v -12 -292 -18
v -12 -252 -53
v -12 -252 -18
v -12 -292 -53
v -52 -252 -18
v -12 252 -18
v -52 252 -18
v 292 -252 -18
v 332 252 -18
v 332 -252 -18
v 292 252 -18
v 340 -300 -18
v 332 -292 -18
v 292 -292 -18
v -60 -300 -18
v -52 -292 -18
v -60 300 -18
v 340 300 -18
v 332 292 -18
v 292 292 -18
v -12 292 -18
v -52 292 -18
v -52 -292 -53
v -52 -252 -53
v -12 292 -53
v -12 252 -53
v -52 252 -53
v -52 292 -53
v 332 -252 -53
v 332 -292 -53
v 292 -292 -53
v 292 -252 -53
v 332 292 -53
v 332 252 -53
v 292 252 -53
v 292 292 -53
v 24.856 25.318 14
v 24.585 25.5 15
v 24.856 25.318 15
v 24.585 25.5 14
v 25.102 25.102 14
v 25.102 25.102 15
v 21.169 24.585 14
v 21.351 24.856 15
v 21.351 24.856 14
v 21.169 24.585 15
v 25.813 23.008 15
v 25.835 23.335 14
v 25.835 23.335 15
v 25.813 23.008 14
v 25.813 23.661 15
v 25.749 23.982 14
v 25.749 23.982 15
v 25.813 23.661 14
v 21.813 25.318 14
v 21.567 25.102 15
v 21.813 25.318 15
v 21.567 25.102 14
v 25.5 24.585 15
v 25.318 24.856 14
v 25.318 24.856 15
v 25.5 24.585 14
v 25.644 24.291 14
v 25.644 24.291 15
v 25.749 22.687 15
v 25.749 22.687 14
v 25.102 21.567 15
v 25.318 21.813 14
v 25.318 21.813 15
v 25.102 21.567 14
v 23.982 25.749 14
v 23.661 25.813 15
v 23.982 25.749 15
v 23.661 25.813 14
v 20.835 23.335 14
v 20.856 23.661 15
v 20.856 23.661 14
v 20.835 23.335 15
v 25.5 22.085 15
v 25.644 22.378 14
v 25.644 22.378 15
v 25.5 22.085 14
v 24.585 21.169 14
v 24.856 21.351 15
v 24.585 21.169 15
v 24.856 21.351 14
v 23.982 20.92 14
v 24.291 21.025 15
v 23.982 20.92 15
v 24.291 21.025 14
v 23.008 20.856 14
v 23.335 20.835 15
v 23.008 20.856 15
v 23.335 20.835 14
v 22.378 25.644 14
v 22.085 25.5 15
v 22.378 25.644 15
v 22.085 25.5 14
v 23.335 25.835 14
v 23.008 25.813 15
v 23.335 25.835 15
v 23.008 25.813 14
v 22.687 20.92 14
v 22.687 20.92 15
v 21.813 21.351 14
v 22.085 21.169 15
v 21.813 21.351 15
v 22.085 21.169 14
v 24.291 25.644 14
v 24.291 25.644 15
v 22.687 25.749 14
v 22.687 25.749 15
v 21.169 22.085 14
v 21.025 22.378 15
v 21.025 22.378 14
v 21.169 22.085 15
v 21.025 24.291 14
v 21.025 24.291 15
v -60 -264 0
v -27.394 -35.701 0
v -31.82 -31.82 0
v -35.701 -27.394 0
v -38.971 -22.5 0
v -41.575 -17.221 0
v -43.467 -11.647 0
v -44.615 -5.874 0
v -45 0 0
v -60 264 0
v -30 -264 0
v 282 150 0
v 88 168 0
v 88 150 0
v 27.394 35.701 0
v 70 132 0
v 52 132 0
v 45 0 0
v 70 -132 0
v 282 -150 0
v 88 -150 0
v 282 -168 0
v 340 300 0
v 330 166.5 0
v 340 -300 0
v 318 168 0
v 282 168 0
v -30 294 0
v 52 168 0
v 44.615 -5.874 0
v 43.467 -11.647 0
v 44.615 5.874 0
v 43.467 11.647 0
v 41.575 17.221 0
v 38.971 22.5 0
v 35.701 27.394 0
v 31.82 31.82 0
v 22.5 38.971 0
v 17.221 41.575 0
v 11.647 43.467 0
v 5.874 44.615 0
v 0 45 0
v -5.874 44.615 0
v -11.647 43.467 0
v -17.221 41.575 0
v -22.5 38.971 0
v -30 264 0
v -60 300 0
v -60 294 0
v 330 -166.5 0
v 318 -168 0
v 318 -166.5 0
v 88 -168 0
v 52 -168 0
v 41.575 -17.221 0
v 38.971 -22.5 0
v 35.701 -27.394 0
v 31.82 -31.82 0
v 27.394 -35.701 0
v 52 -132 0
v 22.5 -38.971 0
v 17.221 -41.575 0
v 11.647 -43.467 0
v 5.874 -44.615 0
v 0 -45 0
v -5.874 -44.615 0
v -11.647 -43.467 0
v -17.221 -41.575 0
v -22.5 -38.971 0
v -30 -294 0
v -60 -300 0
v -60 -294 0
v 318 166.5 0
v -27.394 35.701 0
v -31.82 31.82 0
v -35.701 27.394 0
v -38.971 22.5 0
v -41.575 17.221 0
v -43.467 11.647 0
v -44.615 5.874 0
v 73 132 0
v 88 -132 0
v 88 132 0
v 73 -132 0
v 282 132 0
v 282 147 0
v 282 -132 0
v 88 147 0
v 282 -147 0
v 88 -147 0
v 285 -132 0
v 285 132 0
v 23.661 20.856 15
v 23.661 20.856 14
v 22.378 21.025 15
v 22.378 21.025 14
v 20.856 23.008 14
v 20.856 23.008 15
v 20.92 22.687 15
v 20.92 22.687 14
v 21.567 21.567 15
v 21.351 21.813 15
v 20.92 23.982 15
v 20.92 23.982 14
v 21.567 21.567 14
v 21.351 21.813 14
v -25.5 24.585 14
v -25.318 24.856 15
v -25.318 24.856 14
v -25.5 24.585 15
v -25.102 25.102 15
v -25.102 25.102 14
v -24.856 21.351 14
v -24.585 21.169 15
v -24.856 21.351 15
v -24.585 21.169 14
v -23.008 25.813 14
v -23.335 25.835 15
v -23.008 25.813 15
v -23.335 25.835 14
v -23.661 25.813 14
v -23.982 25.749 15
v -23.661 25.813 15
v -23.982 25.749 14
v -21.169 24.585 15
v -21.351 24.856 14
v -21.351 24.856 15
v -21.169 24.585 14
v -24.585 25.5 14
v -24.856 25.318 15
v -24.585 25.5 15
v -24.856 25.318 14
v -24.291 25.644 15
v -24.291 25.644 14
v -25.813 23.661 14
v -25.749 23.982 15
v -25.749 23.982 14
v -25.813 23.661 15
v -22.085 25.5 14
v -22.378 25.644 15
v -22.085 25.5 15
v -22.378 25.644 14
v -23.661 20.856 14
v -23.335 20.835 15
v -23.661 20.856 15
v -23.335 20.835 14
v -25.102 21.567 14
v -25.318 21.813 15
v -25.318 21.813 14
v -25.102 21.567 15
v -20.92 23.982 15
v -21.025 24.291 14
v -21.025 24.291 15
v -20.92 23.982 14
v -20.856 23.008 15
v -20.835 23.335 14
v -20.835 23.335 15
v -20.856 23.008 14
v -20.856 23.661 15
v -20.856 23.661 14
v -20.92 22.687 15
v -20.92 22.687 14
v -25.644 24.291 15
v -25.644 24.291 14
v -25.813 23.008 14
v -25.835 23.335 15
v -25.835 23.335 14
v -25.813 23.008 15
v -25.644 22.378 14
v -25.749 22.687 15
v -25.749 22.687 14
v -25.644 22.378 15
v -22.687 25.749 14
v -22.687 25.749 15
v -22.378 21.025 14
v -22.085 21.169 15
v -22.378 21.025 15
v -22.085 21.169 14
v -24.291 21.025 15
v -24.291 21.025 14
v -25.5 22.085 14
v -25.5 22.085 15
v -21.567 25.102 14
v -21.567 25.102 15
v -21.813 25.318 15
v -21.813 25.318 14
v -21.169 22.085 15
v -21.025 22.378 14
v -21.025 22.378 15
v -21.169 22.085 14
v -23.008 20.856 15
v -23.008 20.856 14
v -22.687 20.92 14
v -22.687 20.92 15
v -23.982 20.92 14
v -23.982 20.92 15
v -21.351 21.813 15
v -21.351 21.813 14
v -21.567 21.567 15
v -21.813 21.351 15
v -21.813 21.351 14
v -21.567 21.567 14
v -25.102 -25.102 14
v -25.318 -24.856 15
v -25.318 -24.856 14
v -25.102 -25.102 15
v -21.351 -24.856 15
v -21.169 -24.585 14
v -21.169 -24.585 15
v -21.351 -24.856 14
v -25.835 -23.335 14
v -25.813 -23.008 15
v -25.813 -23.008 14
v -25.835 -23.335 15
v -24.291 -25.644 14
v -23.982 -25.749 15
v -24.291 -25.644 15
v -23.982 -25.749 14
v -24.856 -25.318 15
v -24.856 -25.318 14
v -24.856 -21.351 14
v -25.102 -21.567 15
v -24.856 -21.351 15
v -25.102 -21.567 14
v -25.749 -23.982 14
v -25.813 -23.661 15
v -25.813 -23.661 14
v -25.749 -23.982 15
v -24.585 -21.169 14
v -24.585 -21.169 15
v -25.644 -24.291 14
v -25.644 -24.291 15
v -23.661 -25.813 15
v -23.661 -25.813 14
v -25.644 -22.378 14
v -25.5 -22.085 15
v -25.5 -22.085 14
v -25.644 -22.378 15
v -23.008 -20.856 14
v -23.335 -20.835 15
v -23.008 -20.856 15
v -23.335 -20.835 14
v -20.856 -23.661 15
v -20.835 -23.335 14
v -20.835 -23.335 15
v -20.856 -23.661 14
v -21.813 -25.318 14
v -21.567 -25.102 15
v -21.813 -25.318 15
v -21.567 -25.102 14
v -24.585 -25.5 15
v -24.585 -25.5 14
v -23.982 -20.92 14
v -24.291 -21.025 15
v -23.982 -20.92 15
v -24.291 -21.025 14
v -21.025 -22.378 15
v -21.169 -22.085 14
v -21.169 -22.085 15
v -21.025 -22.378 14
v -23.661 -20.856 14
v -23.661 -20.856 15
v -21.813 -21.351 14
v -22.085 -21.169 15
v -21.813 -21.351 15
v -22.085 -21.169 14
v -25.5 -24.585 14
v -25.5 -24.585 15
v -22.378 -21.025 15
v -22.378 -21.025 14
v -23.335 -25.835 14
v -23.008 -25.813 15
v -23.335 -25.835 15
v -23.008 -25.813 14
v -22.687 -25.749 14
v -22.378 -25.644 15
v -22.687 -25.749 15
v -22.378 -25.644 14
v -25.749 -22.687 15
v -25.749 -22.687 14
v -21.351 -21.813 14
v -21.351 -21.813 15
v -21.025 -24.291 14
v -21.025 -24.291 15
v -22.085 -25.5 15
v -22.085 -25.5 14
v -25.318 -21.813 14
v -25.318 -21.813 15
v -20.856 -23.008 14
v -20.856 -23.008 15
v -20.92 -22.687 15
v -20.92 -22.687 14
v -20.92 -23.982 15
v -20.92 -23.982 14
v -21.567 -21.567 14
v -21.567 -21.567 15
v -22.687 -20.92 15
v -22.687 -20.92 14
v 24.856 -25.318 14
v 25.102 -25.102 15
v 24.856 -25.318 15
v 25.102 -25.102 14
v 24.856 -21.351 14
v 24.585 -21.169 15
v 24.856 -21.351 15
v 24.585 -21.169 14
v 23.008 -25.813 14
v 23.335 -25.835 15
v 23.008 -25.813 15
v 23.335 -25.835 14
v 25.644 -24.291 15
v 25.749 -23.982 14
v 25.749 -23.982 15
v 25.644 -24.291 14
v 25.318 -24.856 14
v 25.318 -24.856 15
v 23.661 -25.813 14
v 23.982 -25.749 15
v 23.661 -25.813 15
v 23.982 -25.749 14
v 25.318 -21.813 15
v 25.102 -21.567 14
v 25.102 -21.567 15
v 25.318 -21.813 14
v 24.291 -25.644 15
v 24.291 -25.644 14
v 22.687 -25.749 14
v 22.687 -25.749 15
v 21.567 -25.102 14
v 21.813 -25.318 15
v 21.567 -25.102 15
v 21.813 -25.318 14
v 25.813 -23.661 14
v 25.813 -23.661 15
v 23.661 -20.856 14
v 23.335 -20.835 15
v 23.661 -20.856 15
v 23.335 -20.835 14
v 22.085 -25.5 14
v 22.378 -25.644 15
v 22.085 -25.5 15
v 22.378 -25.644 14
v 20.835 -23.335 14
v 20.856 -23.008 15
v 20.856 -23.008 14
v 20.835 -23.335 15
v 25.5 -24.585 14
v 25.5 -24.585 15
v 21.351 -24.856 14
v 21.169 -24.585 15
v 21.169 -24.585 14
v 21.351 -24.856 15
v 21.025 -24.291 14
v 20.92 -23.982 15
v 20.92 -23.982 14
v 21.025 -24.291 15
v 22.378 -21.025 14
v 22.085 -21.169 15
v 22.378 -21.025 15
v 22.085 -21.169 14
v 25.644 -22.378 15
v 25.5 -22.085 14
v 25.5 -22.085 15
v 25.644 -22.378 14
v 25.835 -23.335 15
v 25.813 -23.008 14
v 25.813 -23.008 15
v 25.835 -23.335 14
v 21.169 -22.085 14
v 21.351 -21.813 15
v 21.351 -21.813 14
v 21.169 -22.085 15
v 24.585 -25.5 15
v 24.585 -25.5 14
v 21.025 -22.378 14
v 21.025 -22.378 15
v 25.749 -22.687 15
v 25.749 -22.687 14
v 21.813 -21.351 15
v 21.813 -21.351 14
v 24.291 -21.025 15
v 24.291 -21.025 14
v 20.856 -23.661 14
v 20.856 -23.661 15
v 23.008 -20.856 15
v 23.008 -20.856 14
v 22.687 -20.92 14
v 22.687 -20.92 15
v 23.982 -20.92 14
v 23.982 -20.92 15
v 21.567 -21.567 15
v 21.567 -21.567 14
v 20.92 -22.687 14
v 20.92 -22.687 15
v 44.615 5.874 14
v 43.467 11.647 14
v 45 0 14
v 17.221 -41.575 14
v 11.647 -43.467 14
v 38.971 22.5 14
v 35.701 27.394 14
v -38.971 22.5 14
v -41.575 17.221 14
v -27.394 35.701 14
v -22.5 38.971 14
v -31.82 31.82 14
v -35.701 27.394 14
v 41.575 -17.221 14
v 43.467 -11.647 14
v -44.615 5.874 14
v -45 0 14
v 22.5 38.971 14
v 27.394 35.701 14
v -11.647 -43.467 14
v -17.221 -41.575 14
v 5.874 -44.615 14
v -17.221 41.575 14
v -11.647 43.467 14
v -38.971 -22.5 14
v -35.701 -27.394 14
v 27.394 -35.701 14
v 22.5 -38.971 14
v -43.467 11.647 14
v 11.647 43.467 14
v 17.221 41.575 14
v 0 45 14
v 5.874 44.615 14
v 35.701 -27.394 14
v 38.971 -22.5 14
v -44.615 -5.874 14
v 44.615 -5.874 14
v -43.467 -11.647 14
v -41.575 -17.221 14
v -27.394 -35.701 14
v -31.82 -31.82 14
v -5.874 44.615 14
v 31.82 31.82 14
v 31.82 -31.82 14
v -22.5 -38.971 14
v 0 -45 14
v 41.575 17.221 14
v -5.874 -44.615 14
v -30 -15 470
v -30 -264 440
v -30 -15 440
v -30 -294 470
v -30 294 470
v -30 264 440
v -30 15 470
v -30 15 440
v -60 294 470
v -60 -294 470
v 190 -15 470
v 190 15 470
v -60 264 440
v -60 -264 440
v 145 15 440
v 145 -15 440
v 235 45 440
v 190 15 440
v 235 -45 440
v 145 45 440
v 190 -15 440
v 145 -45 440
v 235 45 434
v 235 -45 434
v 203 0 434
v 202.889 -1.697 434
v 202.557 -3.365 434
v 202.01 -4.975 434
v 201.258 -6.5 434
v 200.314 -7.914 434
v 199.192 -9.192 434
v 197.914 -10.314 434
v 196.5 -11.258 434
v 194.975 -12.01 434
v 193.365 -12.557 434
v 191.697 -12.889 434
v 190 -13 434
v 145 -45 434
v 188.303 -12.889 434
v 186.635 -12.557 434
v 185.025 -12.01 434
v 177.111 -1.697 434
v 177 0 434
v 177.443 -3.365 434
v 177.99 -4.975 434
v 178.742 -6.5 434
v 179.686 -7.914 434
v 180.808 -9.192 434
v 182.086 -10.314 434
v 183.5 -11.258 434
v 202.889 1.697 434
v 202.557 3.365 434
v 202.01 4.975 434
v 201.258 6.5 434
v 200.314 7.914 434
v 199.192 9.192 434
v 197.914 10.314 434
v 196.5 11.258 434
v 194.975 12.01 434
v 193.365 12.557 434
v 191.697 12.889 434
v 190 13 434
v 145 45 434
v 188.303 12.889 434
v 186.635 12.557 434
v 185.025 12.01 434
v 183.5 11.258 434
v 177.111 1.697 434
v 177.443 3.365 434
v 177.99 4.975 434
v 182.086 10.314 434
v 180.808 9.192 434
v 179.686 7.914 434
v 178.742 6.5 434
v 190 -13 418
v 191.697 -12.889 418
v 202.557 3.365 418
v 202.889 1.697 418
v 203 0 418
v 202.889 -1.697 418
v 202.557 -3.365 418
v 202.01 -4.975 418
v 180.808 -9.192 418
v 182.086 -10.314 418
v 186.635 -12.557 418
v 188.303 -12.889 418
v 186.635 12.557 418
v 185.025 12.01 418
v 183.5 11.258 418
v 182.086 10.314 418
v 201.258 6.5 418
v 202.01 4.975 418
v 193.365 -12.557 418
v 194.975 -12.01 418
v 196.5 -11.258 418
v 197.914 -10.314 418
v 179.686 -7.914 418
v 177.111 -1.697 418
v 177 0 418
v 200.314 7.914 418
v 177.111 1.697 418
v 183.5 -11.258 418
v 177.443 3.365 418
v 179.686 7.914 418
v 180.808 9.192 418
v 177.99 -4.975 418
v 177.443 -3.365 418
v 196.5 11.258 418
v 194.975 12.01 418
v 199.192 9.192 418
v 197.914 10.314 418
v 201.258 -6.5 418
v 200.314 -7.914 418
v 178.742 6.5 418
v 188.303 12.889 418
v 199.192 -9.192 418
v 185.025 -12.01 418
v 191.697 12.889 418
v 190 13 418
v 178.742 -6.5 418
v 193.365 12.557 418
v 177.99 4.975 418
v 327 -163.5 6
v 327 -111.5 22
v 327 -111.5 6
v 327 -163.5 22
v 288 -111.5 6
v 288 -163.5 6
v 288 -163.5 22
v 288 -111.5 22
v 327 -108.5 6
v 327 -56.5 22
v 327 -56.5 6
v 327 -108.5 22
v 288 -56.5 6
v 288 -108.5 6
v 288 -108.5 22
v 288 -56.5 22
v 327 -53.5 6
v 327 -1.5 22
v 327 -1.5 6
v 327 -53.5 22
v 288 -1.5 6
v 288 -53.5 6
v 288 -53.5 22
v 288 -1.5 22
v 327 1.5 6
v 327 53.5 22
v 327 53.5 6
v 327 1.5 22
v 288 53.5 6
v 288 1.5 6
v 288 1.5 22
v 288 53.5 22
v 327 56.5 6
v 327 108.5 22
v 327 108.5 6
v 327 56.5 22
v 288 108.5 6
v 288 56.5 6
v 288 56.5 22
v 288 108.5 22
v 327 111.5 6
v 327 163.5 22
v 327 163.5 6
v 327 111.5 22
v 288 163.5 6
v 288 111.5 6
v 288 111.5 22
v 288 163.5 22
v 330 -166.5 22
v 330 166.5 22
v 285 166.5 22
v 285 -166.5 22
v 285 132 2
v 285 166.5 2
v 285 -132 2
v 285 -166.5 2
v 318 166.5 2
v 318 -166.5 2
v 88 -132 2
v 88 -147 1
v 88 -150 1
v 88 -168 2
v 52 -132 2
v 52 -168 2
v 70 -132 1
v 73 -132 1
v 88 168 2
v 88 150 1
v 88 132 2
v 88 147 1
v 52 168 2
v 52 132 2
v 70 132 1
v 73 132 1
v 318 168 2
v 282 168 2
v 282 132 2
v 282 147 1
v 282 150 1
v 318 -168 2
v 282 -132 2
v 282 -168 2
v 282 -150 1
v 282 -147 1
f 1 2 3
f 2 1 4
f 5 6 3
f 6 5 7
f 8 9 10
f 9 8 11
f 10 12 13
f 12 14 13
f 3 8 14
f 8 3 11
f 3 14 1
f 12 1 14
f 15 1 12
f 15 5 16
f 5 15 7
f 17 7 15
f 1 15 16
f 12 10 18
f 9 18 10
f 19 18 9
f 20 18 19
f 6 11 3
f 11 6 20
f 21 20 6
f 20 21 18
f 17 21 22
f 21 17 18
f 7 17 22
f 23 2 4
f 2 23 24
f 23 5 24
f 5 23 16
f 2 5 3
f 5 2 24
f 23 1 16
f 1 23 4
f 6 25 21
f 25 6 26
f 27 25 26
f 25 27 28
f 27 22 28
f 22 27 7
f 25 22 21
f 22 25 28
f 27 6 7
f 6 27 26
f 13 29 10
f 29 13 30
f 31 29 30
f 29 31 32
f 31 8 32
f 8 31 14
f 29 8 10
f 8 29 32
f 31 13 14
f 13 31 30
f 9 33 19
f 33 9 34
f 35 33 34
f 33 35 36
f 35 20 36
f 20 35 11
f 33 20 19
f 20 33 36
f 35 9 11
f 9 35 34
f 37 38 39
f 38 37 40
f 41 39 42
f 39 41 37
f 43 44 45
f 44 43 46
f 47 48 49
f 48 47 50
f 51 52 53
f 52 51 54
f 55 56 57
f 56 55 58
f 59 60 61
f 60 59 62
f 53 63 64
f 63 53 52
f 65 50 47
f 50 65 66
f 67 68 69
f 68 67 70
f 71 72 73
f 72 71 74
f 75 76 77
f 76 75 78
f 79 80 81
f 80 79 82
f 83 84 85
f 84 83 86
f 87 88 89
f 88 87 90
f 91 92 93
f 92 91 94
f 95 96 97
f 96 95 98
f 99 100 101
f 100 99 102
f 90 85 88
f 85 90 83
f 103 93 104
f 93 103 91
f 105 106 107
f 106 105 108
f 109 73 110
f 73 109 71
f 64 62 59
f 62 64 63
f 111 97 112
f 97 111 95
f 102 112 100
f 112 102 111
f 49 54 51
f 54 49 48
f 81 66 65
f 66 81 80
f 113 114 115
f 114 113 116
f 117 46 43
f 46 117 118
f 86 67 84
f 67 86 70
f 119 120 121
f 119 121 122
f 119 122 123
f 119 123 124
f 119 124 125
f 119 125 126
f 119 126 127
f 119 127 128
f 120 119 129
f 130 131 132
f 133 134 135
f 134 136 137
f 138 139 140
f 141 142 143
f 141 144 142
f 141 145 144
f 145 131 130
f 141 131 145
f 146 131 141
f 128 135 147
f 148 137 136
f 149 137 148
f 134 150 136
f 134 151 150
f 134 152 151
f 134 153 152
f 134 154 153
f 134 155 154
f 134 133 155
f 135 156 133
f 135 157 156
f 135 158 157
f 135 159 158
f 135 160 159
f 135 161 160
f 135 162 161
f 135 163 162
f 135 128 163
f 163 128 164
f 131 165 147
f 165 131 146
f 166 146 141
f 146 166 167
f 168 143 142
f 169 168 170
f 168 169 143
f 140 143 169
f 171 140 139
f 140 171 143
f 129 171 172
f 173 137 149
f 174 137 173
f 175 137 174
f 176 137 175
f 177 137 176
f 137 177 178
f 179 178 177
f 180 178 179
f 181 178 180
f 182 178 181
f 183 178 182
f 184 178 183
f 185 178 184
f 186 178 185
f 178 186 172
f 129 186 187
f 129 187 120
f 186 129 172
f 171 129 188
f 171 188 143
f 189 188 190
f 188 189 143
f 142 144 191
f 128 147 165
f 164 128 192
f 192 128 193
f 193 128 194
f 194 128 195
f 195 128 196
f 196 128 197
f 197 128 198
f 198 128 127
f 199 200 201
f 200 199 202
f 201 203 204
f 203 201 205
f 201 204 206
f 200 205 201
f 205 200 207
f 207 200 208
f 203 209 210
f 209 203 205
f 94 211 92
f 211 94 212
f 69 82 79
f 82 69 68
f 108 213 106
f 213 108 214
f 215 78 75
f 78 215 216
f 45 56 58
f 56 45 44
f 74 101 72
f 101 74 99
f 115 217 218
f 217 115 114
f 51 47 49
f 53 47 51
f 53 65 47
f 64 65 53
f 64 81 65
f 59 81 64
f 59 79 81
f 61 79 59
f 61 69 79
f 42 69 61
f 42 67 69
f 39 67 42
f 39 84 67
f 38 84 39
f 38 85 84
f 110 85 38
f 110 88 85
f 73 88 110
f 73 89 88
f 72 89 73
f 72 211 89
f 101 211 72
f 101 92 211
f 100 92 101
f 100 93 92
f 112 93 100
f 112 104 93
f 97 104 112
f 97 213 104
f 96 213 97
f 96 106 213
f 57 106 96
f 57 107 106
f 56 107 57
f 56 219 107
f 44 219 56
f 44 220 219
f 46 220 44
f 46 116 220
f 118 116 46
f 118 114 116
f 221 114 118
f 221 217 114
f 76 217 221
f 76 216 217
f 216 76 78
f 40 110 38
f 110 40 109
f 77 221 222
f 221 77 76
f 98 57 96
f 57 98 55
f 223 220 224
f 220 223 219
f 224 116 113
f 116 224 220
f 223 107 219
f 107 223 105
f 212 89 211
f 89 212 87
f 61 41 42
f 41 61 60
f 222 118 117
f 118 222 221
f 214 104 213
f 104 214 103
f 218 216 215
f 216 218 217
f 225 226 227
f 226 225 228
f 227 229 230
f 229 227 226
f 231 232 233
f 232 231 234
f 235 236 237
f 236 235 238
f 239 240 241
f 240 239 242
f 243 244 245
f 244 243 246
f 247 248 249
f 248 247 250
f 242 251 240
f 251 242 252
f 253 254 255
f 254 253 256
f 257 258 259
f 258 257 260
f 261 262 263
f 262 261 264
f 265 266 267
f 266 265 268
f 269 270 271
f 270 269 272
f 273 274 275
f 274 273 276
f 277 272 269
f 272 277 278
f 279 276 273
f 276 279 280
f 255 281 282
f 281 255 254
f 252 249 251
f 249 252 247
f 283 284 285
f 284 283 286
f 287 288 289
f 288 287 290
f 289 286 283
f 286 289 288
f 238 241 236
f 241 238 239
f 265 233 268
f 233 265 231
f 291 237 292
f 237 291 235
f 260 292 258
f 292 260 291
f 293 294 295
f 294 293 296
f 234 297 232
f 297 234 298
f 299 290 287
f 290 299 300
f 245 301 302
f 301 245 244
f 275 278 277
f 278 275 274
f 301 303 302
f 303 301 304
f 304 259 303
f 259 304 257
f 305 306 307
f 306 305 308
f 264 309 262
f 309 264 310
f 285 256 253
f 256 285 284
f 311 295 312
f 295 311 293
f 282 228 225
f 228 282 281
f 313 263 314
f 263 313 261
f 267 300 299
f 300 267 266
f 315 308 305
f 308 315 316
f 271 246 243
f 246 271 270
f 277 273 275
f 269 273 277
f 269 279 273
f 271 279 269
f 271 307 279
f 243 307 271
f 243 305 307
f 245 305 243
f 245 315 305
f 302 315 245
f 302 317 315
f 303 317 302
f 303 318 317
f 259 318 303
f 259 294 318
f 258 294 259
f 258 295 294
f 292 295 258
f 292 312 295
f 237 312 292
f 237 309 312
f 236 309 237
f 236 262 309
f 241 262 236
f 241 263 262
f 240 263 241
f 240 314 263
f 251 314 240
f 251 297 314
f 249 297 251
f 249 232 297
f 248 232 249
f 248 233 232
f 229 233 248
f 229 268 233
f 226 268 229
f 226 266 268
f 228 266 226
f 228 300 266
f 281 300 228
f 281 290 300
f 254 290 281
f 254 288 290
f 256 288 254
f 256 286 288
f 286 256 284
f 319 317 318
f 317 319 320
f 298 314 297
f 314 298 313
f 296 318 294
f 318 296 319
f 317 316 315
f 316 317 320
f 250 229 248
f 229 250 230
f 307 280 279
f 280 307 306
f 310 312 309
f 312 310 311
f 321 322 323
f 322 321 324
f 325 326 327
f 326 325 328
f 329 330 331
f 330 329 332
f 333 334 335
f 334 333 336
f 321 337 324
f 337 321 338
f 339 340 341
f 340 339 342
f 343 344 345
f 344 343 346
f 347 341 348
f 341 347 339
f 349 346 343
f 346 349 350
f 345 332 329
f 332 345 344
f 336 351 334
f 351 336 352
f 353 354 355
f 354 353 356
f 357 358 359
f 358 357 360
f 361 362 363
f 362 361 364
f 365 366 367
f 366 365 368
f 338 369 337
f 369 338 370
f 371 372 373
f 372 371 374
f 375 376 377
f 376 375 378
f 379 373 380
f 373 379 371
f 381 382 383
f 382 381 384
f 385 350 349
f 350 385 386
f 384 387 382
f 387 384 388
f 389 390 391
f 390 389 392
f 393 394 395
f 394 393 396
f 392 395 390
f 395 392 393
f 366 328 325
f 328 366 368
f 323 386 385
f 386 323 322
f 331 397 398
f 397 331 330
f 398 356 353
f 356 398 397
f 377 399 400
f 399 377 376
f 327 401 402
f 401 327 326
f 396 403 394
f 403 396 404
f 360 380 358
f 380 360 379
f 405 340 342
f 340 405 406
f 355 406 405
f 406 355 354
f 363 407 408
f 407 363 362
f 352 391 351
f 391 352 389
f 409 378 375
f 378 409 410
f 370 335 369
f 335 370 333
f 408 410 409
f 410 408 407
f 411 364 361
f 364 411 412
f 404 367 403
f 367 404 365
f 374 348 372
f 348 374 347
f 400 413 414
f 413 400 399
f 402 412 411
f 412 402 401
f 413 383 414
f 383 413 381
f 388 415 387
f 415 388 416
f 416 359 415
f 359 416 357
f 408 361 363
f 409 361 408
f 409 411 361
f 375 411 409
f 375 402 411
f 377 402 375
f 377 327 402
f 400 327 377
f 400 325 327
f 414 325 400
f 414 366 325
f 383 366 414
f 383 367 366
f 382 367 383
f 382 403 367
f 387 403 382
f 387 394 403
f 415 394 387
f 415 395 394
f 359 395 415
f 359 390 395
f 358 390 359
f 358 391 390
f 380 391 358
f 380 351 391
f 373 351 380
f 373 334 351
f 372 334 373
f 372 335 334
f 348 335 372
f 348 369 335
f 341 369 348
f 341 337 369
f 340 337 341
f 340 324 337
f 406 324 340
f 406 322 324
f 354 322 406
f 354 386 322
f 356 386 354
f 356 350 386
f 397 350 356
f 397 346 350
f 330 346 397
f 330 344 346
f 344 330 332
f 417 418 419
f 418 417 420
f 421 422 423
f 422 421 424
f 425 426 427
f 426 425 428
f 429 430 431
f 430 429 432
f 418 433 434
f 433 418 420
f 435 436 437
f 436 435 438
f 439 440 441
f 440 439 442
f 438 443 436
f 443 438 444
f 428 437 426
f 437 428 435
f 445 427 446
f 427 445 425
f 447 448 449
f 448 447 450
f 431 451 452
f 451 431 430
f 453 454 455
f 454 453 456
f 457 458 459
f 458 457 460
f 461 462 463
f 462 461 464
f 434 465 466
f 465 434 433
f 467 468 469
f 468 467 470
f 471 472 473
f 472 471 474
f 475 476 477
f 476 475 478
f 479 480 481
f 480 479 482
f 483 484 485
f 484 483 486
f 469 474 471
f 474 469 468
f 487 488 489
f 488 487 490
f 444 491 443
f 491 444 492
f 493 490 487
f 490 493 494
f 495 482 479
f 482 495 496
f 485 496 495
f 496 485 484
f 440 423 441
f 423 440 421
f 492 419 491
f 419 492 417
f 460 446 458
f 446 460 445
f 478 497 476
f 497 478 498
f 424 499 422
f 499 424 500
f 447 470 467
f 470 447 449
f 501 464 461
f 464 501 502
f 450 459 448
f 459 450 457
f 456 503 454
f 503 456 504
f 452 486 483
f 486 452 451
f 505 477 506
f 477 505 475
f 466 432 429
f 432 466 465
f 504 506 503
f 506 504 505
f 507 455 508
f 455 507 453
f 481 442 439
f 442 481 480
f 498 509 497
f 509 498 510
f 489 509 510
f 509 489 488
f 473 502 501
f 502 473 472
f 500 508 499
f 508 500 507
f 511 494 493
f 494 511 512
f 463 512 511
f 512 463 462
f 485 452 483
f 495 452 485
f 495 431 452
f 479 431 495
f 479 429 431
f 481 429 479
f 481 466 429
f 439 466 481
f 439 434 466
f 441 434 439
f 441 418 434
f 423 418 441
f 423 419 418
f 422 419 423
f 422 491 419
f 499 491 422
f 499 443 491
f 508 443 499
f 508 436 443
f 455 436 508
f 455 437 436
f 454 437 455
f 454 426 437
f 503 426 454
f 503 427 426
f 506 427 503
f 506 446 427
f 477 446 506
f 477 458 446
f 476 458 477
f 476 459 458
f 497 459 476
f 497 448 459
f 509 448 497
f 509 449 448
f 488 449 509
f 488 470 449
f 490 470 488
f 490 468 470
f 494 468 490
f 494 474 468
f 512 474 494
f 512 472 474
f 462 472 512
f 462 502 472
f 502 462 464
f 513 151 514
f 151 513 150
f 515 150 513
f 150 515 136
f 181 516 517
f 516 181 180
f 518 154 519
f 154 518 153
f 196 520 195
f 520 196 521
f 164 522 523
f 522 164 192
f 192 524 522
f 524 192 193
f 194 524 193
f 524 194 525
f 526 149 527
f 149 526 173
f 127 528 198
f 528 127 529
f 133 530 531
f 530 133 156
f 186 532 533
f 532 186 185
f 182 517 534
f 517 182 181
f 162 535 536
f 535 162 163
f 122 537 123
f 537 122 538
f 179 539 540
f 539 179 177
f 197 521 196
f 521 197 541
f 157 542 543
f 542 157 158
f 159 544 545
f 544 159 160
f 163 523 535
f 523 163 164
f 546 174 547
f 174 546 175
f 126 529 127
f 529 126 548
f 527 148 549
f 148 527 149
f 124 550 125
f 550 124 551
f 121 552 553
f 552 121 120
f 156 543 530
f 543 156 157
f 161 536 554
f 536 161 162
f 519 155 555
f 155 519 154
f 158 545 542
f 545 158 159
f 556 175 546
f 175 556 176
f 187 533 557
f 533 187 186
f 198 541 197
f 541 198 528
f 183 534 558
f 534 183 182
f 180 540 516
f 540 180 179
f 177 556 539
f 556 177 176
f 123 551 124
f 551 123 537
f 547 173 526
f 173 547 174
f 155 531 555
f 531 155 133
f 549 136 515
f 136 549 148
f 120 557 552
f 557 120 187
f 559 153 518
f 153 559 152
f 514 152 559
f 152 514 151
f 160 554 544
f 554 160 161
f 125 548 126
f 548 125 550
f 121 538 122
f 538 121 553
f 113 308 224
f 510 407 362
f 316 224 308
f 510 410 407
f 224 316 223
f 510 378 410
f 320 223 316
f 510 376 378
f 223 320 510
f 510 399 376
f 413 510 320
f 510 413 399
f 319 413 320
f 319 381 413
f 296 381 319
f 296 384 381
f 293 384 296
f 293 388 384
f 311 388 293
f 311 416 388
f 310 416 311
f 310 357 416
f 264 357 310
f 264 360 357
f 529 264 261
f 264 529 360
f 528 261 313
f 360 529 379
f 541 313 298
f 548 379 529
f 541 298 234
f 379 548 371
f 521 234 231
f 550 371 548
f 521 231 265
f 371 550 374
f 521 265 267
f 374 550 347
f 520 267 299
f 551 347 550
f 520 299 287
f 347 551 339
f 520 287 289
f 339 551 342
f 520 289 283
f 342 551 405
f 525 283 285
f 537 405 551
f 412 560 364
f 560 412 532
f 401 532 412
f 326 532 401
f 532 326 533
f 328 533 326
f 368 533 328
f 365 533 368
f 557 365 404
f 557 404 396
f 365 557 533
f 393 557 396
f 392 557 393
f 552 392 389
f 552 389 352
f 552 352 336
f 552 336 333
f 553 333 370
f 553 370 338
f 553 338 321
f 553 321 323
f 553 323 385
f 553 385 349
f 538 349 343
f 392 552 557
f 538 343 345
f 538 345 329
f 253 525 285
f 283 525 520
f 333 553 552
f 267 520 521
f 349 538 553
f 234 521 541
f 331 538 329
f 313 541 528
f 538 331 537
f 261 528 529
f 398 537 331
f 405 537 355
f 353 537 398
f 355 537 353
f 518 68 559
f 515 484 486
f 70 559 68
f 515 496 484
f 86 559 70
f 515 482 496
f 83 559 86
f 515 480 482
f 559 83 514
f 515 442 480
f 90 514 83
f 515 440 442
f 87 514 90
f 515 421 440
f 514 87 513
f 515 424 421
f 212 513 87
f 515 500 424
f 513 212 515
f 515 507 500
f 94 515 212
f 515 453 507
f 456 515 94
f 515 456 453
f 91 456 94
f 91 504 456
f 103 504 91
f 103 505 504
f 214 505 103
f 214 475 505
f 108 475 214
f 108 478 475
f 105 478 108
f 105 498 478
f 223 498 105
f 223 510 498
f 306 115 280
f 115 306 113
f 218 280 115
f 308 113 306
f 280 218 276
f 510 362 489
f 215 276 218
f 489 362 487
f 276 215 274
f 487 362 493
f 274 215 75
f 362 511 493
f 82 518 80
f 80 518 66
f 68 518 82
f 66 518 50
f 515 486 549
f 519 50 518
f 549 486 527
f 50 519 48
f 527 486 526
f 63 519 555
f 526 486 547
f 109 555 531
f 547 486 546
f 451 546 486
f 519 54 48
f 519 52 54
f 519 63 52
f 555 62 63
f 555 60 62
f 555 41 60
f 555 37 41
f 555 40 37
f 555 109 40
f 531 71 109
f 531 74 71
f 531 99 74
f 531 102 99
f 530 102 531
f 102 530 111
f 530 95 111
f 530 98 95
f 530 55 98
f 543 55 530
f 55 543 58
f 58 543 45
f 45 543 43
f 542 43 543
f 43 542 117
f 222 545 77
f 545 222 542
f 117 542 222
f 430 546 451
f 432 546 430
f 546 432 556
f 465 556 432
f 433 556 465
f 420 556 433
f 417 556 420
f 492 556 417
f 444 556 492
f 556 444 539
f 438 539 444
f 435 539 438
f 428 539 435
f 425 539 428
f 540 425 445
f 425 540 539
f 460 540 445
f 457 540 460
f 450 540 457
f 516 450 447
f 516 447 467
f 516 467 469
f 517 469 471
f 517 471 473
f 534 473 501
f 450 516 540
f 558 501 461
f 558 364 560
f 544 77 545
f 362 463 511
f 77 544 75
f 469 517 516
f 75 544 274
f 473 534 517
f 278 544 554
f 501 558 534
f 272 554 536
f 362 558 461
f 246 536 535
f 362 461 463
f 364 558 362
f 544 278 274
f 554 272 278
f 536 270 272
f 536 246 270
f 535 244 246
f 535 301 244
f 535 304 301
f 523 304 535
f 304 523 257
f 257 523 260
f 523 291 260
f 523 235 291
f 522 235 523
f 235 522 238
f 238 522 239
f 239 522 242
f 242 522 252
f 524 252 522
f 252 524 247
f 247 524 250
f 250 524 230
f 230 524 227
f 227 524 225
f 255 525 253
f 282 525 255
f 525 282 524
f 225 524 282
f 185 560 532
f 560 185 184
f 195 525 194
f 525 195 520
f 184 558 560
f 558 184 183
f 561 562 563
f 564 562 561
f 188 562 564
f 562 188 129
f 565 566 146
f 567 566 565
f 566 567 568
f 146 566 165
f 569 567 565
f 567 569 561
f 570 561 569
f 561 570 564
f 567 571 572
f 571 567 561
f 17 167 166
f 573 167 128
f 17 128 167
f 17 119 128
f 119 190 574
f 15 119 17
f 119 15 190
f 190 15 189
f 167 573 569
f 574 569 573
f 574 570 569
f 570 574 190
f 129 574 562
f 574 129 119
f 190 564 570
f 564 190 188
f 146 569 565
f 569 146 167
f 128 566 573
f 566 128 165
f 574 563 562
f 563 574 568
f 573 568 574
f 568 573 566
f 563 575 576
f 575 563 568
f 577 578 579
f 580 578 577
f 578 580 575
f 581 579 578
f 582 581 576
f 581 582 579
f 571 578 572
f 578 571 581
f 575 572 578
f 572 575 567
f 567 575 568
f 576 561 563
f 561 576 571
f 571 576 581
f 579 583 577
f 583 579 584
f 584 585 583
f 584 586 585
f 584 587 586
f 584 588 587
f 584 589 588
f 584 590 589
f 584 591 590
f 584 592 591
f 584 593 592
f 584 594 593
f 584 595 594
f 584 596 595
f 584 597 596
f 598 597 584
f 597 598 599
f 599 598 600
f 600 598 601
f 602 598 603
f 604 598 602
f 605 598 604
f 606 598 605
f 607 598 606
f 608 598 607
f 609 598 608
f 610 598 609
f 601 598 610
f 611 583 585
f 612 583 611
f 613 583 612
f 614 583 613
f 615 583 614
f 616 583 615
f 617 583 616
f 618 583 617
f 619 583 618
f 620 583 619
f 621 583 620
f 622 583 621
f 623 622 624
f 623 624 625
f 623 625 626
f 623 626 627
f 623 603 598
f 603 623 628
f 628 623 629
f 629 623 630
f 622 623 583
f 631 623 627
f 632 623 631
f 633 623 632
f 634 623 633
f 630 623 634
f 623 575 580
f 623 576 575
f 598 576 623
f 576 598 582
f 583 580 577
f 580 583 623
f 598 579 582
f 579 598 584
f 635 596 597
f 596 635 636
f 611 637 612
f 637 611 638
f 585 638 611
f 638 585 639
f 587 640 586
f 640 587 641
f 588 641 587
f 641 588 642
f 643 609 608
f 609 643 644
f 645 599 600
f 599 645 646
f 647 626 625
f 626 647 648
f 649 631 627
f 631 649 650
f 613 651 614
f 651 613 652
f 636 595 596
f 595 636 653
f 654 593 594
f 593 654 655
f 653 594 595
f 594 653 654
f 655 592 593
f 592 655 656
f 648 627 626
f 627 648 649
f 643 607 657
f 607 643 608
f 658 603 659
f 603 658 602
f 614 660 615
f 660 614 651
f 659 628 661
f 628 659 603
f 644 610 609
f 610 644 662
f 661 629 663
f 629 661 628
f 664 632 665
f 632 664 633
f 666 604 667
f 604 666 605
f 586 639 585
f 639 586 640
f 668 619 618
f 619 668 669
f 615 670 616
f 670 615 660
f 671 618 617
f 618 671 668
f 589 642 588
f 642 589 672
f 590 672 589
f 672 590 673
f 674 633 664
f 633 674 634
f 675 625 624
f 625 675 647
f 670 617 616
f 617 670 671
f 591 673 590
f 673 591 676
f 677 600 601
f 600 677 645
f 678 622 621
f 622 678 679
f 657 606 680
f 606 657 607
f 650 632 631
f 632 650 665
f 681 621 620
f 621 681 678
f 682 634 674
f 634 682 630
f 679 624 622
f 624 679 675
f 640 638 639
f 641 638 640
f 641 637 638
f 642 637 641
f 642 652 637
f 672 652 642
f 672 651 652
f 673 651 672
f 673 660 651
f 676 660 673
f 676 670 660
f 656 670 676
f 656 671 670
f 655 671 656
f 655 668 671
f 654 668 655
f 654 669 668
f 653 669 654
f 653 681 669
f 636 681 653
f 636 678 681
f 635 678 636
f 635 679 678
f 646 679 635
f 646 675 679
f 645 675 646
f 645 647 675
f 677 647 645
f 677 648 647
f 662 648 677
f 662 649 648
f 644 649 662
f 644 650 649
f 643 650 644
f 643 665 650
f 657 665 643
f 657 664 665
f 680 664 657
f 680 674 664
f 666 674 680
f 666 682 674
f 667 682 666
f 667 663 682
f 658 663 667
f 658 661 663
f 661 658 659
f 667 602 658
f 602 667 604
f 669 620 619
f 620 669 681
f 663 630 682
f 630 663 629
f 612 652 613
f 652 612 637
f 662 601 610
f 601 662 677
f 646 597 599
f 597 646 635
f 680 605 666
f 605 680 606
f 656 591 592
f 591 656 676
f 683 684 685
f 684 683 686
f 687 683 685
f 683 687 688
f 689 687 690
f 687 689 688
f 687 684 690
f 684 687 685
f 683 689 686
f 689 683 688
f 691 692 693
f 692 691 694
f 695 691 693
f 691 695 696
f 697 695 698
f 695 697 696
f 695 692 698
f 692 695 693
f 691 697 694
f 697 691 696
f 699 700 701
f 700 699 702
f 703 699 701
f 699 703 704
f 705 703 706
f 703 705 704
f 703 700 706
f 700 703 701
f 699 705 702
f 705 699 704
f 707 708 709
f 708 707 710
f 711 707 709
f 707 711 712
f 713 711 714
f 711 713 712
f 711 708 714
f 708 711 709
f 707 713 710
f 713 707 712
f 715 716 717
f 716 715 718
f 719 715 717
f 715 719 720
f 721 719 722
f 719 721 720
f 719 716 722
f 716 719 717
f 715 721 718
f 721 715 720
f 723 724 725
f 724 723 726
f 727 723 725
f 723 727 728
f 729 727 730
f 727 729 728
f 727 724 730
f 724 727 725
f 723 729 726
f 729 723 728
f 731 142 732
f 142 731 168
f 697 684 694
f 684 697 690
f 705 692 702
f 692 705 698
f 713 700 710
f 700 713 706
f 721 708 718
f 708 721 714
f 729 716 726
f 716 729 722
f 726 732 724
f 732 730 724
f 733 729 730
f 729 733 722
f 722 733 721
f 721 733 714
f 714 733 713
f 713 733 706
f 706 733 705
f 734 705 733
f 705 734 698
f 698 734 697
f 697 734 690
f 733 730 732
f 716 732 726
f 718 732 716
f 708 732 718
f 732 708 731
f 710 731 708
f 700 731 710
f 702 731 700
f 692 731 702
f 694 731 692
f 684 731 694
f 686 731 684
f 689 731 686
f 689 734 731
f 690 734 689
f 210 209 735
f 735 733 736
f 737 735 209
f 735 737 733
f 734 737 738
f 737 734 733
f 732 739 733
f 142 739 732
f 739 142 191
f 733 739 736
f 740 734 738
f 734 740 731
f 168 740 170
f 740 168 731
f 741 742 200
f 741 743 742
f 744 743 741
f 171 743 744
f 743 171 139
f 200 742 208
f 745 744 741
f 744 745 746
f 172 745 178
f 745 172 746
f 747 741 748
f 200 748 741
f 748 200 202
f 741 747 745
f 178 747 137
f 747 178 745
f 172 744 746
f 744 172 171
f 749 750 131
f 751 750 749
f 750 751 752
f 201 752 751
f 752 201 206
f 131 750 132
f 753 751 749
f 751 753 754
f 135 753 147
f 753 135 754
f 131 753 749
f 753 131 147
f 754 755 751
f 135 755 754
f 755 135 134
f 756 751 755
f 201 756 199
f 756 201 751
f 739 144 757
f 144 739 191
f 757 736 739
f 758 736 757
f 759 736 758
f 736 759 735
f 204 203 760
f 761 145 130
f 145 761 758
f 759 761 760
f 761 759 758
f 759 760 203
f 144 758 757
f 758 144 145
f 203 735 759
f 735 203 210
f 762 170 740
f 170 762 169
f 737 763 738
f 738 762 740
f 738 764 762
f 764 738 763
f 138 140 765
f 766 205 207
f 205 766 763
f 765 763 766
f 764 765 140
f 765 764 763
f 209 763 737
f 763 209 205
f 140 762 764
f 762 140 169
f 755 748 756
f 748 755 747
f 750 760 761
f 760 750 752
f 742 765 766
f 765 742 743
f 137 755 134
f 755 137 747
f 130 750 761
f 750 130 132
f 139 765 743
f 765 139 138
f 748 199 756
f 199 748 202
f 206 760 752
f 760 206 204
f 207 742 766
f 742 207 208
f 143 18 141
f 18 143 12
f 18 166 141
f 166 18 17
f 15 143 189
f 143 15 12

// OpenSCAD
// TACTIN workbench — parametric benchtop fixture for the pick-and-place arm.
//
// A rigid work surface with: an arm mounting boss at the back-centre, an
// overhead gantry holding the downward-looking camera centred over the work
// zone, four ArUco calibration pads at the corners of that zone, and a row of
// part-feeder tray cells along the front edge.
//
// Frame matches the software (tactin.geometry): origin at the arm base on the
// surface top, +X toward the front of the bench (toward the work zone), +Y to
// the operator's left, +Z up. The reachable work area is X 70..300, Y +-150.
//
// Render:  openscad -o workbench.stl hardware/workbench.scad
//          openscad -o workbench.png --viewall --autocenter hardware/workbench.scad

$fn = 48;

// ---- parameters (mm) -------------------------------------------------------
bench_depth   = 400;   // X, front-back
bench_width   = 600;   // Y, left-right
surface_t     = 18;    // work-surface thickness
foot_h        = 35;    // benchtop standoff feet
foot          = 40;    // foot footprint

arm_base_inset = 60;   // arm boss distance from the back edge
arm_boss_d     = 90;   // arm mounting boss diameter
arm_boss_h     = 14;

gantry_post    = 30;   // gantry post cross-section
gantry_h       = 470;  // camera height above the surface
cam_plate      = 90;   // camera mount plate size
cam_x          = 190;  // camera centred over the middle of the work zone (X)

tray_cells     = 6;
tray_cell      = 55;
tray_depth     = 45;
tray_wall      = 3;

aruco_pad      = 36;
aruco_pad_h    = 2;

// Work-zone corners (for the calibration pads), in the software frame.
work_x0 = 70;  work_x1 = 300;
work_y0 = -150; work_y1 = 150;

// A box centred in X/Y, resting with its base at z = zbase.
module box(sx, sy, sz, x, y, zbase) {
    translate([x, y, zbase + sz/2]) cube([sx, sy, sz], center = true);
}

// ---- parts -----------------------------------------------------------------
// The surface top is z=0; the slab hangs below it. The arm base is at (0,0,0).
module work_surface() {
    color("BurlyWood")
        box(bench_depth, bench_width, surface_t,
            bench_depth/2 - arm_base_inset, 0, -surface_t);
}

module feet() {
    fx0 = -arm_base_inset + foot/2 + 8;
    fx1 = bench_depth - arm_base_inset - foot/2 - 8;
    fy  = bench_width/2 - foot/2 - 8;
    color("DimGray")
        for (p = [[fx0,-fy],[fx0,fy],[fx1,-fy],[fx1,fy]])
            box(foot, foot, foot_h, p[0], p[1], -surface_t - foot_h);
}

module arm_mount() {
    color("SteelBlue") {
        cylinder(d = arm_boss_d, h = arm_boss_h);
        for (a = [45 : 90 : 315])
            rotate([0, 0, a]) translate([arm_boss_d/2 - 12, 0, 0])
                cylinder(d = 5, h = arm_boss_h + 1);
    }
}

module gantry() {
    px = -arm_base_inset + gantry_post/2;
    py = bench_width/2 - gantry_post/2 - 6;
    color("Gainsboro") {
        box(gantry_post, gantry_post, gantry_h, px, -py, 0);   // left post
        box(gantry_post, gantry_post, gantry_h, px,  py, 0);   // right post
        box(gantry_post, bench_width - 12, gantry_post,        // cross-beam
            px, 0, gantry_h - gantry_post);
        box(cam_x + arm_base_inset, gantry_post, gantry_post,  // forward boom
            (cam_x - arm_base_inset)/2, 0, gantry_h - gantry_post);
    }
    camera_mount();
}

module camera_mount() {
    color("DarkSlateGray")
        box(cam_plate, cam_plate, 6, cam_x, 0, gantry_h - gantry_post - 6);
    color("Black")
        translate([cam_x, 0, gantry_h - gantry_post - 6 - 16]) cylinder(d = 26, h = 16);
}

module tray_rail() {
    rail_w = tray_cells * tray_cell + tray_wall;
    translate([bench_depth - arm_base_inset - tray_depth - 10, -rail_w/2, 0])
        color("DarkKhaki")
        difference() {
            cube([tray_depth, rail_w, 22]);
            for (i = [0 : tray_cells - 1])
                translate([tray_wall, tray_wall + i*tray_cell, 6])
                    cube([tray_depth - 2*tray_wall, tray_cell - tray_wall, 20]);
        }
}

module aruco_pads() {
    color("White")
        for (p = [[work_x0,work_y0],[work_x0,work_y1],[work_x1,work_y1],[work_x1,work_y0]])
            box(aruco_pad, aruco_pad, aruco_pad_h, p[0], p[1], 0);
}

module work_zone_outline() {
    w = work_x1 - work_x0;
    h = work_y1 - work_y0;
    color("Sienna")
    translate([(work_x0 + work_x1)/2, 0, 0.4])  // sunk 0.2mm to avoid coplanar z-fight
        difference() {
            cube([w, h, 1.2], center = true);
            cube([w - 6, h - 6, 2.0], center = true);
        }
}

module workbench() {
    work_surface();
    feet();
    arm_mount();
    gantry();
    tray_rail();
    aruco_pads();
    work_zone_outline();
}

workbench();
